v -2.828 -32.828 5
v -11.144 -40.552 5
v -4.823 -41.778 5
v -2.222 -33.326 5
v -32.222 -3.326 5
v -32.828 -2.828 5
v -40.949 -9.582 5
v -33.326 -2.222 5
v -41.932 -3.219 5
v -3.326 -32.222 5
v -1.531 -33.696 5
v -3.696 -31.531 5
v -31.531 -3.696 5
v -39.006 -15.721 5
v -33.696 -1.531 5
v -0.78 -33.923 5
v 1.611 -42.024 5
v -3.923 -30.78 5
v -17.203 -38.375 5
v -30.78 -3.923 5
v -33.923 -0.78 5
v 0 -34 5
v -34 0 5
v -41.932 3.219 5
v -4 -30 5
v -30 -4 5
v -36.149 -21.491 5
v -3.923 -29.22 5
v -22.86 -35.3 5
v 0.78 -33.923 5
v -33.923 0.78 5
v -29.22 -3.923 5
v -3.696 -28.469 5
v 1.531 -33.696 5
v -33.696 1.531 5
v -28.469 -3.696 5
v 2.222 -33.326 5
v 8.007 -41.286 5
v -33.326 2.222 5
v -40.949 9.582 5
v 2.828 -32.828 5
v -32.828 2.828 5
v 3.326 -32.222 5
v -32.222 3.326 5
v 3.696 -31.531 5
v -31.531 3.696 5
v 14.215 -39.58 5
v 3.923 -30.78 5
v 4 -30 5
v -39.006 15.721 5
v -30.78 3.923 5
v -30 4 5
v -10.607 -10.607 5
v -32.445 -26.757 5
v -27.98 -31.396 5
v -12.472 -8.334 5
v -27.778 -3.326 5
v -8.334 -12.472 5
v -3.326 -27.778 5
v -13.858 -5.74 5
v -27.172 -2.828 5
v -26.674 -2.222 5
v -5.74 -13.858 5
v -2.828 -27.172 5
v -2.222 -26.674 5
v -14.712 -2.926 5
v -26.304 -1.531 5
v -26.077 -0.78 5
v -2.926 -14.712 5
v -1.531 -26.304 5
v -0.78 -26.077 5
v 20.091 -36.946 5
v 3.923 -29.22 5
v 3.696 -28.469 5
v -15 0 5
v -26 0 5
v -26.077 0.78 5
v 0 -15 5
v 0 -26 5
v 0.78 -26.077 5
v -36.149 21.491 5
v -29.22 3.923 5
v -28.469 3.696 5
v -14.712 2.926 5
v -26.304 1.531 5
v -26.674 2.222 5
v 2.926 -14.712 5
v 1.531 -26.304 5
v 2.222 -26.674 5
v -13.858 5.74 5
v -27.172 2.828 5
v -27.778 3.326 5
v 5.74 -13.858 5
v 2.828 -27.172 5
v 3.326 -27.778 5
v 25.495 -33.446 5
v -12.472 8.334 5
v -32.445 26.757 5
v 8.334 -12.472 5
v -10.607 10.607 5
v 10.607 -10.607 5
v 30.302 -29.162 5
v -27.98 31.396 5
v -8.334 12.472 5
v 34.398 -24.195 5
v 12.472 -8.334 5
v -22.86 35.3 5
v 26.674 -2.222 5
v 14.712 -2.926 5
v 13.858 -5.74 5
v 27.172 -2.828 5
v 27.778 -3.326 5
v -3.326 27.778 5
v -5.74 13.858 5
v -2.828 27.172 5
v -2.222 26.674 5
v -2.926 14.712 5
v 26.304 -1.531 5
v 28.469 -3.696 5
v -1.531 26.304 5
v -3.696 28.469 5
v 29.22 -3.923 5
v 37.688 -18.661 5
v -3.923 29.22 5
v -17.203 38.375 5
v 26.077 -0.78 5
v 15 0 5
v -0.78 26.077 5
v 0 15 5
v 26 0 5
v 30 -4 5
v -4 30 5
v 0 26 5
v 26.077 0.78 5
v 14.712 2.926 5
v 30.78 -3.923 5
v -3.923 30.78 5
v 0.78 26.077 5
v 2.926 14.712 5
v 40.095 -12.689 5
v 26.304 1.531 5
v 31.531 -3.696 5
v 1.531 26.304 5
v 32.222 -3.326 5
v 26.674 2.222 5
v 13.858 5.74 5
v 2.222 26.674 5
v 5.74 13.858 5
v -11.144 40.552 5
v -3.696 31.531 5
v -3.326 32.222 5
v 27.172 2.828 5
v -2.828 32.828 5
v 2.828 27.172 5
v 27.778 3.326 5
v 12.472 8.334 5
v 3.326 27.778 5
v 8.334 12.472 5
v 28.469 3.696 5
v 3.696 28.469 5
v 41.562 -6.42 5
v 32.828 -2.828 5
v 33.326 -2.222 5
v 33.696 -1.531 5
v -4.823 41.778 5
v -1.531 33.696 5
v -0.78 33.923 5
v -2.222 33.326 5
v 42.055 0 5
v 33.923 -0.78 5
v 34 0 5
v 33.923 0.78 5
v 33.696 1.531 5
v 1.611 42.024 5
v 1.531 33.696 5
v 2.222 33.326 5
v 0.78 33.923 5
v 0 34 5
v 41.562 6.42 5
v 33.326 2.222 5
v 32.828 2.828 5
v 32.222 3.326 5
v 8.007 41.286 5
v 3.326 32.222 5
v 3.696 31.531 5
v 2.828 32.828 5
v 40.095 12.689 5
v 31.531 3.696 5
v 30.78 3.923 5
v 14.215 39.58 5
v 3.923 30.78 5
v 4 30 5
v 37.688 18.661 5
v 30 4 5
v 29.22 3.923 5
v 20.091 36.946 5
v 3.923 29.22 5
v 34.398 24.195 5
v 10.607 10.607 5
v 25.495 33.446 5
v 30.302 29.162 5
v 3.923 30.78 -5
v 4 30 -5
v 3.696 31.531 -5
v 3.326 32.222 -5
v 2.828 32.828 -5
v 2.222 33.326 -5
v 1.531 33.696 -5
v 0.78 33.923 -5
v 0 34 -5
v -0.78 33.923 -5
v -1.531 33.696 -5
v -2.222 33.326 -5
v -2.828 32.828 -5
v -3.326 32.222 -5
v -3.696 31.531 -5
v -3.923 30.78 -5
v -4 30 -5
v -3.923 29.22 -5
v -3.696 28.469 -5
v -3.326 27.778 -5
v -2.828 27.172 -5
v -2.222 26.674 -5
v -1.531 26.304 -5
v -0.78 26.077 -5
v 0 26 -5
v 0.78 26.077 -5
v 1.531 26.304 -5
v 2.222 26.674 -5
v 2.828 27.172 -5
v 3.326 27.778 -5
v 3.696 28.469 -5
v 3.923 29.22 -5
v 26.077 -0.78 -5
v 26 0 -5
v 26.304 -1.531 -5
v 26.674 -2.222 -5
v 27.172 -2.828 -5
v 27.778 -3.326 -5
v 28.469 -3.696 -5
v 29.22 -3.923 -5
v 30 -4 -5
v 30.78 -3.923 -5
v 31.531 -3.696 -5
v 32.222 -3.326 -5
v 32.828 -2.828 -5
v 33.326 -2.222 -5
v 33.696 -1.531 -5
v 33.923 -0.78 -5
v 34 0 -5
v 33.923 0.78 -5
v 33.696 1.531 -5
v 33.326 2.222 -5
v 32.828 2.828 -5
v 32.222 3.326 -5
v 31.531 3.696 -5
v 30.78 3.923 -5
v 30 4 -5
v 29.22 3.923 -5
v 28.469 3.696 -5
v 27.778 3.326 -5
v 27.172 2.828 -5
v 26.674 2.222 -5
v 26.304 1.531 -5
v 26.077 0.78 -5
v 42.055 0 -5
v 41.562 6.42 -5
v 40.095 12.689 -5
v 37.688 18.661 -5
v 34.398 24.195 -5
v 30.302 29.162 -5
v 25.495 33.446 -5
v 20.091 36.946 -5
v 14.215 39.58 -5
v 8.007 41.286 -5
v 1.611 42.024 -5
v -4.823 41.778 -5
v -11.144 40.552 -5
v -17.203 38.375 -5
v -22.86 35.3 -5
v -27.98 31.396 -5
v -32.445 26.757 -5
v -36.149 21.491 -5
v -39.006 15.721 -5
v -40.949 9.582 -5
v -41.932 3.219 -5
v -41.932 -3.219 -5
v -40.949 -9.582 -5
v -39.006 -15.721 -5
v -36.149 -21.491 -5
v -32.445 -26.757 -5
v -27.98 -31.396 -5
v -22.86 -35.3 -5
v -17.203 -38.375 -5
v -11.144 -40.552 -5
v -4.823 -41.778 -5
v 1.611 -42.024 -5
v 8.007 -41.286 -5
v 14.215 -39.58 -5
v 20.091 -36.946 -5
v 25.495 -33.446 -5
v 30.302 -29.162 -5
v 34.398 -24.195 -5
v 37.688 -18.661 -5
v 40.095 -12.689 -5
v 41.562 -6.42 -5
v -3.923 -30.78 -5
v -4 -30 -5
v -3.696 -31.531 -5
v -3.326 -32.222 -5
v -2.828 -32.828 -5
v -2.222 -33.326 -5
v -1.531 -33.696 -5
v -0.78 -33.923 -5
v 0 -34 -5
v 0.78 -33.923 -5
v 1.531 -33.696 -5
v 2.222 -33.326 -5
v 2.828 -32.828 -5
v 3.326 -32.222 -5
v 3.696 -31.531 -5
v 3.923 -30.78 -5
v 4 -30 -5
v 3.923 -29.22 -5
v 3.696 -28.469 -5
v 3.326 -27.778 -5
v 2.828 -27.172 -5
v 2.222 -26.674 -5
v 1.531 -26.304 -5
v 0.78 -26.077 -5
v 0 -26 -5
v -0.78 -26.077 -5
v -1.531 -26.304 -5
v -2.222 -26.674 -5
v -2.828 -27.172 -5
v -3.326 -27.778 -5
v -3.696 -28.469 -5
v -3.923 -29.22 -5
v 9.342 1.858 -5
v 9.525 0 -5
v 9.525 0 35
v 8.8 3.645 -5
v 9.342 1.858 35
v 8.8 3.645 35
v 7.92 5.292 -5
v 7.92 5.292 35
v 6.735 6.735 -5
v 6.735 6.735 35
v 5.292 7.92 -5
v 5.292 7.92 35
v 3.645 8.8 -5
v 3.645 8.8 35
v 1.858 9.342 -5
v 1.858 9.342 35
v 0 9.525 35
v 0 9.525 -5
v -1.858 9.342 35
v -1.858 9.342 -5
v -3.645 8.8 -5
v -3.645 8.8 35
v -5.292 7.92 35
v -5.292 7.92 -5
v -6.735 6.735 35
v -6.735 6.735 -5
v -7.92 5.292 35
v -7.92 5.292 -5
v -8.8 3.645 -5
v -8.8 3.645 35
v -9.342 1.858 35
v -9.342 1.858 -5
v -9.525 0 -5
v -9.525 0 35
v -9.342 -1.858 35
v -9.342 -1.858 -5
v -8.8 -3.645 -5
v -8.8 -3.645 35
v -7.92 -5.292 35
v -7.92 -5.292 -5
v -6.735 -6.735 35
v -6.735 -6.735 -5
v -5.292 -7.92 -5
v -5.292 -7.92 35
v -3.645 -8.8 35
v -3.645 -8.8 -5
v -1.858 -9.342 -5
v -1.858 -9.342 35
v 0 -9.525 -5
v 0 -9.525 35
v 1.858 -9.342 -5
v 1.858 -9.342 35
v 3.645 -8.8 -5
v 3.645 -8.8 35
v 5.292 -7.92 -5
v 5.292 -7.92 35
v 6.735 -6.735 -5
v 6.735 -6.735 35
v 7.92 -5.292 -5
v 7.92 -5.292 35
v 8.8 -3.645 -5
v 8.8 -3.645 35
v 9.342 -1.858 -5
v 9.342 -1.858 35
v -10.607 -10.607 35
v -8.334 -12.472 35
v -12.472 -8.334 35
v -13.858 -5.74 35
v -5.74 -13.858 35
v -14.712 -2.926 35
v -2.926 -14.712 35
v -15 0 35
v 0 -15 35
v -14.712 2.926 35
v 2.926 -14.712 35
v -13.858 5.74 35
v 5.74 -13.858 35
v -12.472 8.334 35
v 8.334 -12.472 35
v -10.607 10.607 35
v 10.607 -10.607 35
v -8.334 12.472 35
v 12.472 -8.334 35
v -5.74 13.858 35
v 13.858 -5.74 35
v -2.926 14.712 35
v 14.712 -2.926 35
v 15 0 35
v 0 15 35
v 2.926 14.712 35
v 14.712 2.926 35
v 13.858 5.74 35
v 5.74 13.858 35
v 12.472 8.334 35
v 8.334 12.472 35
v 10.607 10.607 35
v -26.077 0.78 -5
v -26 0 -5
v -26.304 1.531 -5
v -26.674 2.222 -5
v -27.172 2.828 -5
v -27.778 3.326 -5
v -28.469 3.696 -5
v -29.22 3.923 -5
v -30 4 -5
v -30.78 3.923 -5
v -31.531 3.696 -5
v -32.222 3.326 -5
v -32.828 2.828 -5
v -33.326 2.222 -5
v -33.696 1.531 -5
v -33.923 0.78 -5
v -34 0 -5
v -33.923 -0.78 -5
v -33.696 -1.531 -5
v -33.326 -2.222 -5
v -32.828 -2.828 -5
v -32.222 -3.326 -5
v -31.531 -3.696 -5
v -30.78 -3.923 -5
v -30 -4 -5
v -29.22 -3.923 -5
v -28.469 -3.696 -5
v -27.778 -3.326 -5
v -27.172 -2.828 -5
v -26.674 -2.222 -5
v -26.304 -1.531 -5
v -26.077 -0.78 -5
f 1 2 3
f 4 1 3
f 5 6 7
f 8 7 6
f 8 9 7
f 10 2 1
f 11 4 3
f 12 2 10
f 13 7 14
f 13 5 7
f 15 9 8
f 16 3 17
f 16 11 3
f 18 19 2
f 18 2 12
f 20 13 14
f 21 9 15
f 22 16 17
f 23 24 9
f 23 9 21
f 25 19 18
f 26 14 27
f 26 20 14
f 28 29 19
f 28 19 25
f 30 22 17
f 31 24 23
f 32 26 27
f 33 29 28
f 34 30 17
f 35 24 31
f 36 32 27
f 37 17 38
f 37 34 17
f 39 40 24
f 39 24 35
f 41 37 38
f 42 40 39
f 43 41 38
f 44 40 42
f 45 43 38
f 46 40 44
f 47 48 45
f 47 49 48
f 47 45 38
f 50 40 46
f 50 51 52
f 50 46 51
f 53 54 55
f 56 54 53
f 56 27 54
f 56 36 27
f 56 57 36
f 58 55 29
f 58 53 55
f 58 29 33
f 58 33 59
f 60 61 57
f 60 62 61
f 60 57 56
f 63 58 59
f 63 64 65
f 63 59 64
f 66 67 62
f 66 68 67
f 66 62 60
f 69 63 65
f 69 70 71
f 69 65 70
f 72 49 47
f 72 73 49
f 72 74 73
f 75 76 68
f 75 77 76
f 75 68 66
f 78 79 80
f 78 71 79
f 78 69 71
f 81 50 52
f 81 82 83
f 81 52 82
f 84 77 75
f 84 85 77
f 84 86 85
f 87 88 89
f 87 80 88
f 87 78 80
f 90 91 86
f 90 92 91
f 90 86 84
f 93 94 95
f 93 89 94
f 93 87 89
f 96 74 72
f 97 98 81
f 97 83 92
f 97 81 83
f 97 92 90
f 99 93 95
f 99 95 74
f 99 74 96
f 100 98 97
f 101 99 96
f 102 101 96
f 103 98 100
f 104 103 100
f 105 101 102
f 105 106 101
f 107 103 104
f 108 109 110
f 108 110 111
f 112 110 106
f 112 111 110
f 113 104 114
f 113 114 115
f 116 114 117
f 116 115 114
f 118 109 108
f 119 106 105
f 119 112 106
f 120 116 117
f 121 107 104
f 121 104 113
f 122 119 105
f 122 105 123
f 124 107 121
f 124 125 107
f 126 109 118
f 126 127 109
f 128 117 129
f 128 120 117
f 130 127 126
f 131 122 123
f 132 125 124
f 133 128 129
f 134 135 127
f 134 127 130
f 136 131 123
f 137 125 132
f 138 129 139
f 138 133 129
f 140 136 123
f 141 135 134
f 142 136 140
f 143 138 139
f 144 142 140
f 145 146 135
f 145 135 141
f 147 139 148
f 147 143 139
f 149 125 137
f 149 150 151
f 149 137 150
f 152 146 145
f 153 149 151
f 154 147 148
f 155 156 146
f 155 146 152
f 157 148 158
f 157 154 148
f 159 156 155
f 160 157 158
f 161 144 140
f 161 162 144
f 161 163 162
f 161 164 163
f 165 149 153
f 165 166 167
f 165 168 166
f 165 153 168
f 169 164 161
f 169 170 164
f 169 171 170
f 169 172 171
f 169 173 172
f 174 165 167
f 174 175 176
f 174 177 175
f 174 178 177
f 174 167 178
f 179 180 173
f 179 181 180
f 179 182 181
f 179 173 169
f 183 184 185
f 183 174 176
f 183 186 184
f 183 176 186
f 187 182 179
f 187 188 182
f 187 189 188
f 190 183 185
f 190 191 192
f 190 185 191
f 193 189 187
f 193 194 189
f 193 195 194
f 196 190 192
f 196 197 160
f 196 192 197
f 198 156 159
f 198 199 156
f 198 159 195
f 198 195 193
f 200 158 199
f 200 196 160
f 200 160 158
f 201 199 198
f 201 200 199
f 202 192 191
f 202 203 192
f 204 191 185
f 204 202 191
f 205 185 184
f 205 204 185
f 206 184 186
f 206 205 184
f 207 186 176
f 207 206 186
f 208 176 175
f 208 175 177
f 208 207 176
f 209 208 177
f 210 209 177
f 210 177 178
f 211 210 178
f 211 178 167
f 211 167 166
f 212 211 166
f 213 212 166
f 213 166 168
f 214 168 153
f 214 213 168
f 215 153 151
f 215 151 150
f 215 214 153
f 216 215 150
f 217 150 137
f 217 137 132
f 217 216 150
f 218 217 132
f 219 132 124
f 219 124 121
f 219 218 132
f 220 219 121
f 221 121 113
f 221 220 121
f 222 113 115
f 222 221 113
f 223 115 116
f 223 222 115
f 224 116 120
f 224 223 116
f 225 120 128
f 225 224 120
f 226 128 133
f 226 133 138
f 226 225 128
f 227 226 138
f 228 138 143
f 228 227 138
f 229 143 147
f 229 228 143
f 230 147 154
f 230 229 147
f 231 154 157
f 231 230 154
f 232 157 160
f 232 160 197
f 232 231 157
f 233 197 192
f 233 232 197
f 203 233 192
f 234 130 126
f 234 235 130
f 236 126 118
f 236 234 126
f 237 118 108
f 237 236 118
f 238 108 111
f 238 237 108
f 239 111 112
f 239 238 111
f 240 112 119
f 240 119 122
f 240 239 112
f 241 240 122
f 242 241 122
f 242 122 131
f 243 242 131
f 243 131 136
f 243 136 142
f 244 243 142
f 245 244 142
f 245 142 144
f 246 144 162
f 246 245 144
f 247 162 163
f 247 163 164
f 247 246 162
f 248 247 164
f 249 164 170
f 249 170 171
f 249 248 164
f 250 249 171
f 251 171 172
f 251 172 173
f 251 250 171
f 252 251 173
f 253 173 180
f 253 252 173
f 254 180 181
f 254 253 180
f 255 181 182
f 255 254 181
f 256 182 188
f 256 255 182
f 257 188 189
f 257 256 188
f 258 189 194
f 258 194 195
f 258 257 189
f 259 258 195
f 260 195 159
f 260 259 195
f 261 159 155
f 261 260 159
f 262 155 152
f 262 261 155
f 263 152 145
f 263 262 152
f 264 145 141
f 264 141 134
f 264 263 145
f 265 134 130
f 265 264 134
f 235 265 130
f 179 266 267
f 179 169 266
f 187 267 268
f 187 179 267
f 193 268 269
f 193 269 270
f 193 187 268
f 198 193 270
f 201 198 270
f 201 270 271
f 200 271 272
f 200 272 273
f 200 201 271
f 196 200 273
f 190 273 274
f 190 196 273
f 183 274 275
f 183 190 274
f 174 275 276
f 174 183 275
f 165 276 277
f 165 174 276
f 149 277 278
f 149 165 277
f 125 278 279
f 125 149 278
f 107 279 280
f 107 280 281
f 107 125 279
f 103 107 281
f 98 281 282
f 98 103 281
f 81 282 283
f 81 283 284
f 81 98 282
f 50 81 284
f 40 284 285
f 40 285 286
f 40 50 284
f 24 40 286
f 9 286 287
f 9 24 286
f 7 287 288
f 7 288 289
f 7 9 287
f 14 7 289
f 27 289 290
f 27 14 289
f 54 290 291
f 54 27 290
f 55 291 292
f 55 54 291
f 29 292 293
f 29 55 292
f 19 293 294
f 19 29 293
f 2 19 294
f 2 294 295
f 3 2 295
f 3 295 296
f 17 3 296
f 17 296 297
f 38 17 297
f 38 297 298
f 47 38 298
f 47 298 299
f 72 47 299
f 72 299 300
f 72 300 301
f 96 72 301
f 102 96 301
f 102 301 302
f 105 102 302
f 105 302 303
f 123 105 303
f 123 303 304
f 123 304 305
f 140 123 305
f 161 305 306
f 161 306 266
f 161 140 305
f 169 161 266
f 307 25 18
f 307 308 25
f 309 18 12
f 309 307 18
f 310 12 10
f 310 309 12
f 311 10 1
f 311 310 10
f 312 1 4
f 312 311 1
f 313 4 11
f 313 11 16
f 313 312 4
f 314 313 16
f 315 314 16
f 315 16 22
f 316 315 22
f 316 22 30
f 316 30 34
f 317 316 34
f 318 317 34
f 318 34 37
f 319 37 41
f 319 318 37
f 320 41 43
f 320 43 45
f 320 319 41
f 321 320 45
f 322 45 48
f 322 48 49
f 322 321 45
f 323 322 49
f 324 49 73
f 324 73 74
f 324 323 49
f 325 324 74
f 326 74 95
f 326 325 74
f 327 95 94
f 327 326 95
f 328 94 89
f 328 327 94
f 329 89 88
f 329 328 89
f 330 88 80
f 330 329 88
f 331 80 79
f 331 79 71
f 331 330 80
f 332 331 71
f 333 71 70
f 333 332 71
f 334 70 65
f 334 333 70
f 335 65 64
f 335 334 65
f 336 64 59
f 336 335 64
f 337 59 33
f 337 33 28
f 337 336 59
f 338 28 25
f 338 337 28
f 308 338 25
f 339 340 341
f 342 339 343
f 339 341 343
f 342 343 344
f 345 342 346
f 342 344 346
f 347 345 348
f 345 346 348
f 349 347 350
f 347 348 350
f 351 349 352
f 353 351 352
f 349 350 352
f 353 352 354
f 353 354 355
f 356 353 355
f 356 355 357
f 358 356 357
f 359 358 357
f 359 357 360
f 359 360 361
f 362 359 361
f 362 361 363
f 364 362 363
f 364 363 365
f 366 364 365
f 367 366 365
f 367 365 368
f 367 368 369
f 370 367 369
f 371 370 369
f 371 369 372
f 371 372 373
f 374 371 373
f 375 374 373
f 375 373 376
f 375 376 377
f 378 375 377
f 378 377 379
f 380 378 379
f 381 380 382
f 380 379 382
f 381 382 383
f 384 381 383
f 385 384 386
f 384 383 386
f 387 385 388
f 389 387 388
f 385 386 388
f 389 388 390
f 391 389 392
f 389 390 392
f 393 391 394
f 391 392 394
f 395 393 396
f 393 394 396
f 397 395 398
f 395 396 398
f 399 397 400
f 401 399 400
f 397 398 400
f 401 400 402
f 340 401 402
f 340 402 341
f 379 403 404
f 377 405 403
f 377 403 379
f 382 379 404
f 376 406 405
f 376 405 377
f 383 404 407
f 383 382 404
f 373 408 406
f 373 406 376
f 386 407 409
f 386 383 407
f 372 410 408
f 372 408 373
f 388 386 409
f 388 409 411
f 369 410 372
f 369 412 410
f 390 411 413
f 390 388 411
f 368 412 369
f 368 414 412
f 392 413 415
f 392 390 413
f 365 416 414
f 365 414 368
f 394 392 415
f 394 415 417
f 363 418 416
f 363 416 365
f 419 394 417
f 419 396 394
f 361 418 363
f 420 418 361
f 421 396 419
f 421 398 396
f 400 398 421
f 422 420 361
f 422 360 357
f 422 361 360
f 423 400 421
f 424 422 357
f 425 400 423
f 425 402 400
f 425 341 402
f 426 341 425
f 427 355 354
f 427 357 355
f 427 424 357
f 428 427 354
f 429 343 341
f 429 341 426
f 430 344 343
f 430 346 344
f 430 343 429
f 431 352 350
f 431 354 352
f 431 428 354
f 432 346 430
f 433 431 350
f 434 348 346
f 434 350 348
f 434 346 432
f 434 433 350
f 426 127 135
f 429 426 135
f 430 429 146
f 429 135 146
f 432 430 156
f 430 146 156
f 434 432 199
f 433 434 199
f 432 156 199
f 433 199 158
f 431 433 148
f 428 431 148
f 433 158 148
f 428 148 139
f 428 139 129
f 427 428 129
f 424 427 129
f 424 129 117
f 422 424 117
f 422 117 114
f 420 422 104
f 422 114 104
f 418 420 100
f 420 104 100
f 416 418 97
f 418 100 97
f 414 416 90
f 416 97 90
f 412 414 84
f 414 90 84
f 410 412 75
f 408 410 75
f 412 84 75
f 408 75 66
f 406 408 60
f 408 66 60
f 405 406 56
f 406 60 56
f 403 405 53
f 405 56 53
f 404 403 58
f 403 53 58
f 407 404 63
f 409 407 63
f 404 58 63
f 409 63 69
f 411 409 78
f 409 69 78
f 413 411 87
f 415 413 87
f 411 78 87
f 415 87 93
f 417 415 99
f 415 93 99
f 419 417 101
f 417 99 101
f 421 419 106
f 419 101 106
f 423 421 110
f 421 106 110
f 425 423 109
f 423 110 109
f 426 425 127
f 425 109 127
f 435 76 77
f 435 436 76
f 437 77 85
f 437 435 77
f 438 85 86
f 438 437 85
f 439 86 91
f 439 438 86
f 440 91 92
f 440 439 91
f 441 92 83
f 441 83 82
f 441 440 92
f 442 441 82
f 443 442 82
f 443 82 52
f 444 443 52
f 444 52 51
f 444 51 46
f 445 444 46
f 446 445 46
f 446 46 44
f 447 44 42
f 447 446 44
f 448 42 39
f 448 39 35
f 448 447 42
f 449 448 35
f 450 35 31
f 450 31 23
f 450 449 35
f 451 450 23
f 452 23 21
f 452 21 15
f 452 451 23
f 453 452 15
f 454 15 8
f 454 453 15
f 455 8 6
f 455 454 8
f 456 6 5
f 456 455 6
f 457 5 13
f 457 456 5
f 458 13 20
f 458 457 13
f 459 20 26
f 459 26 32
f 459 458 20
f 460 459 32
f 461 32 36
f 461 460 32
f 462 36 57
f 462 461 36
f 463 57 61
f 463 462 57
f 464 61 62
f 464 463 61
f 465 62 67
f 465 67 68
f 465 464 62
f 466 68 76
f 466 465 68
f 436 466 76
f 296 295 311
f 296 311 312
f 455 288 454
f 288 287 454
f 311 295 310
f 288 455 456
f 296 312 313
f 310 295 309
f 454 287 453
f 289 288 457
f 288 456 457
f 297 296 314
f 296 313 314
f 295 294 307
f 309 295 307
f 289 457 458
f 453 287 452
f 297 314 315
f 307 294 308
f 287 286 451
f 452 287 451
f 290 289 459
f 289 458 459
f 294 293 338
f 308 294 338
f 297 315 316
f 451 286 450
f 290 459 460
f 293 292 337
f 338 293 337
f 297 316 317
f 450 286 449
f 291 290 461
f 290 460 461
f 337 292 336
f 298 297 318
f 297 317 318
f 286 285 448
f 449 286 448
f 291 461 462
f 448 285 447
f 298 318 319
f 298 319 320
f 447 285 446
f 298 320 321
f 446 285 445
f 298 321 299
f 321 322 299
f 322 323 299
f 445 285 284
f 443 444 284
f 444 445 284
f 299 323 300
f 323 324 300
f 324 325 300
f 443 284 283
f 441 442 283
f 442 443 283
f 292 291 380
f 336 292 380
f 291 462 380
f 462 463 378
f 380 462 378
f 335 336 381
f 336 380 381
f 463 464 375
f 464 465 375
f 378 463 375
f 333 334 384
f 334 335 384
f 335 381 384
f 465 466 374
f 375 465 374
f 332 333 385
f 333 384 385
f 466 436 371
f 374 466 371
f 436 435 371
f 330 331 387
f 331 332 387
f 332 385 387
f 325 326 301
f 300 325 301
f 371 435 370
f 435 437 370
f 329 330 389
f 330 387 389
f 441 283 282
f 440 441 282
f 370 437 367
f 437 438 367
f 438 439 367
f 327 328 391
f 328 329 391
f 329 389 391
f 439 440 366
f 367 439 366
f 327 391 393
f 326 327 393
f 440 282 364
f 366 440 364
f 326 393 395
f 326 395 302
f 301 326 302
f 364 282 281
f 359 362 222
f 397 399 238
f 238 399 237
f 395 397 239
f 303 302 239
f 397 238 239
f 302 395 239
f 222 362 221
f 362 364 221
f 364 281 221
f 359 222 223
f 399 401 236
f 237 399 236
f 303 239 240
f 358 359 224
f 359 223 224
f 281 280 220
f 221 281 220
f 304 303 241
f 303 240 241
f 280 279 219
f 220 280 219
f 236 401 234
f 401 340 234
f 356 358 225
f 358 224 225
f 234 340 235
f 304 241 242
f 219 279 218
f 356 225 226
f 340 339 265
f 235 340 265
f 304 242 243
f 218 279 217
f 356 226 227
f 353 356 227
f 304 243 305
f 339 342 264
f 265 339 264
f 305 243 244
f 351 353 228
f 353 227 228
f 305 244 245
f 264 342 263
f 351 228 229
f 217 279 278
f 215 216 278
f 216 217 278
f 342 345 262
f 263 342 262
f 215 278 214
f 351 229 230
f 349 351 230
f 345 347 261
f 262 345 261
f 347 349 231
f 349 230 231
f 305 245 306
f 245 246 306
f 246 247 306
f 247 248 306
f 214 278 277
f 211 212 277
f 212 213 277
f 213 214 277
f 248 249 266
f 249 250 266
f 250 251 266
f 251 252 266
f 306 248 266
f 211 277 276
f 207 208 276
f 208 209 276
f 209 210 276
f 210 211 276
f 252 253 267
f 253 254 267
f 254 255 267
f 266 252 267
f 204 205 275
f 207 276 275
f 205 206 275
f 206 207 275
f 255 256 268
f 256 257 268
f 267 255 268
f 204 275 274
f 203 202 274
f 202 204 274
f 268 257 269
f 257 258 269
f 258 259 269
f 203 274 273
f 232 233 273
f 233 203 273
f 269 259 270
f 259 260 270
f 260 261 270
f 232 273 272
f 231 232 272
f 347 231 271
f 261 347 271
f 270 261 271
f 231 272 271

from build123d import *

# Parameters (mm, degrees)
SKETCH1_R           = 42.055
SKETCH1_R_2         = 9.525
SKETCH1_R_3         = 4
BOSS_EXTRUDE1_DEPTH = 5
SKETCH2_R           = 15
BOSS_EXTRUDE2_DEPTH = 30
SKETCH3_R           = 9.525
CUT_EXTRUDE1_DEPTH  = 72.674584408


with BuildPart() as part:
    # Sketch1 → Boss-Extrude1 (new, symmetric)
    with BuildSketch(Plane.XY):
        Circle(SKETCH1_R)
        Circle(SKETCH1_R_2, mode=Mode.SUBTRACT)
        with Locations((0, 30)):
            Circle(SKETCH1_R_3, mode=Mode.SUBTRACT)
        with Locations((-30, 0)):
            Circle(SKETCH1_R_3, mode=Mode.SUBTRACT)
        with Locations(Location((0, -30, 0), (0, 0, 180))):
            Circle(SKETCH1_R_3, mode=Mode.SUBTRACT)
        with Locations(Location((30, 0, 0), (0, 0, 180))):
            Circle(SKETCH1_R_3, mode=Mode.SUBTRACT)
    extrude(amount=BOSS_EXTRUDE1_DEPTH, both=True)

    # Sketch2 → Boss-Extrude2 (add)
    with BuildSketch(Plane.XY.offset(5)):
        Circle(SKETCH2_R)
    extrude(amount=BOSS_EXTRUDE2_DEPTH)

    # Sketch3 → Cut-Extrude1 (cut, through all)
    with BuildSketch(Plane.XY.offset(35)):
        Circle(SKETCH3_R)
    extrude(amount=-CUT_EXTRUDE1_DEPTH, mode=Mode.SUBTRACT)


solid = part.part
